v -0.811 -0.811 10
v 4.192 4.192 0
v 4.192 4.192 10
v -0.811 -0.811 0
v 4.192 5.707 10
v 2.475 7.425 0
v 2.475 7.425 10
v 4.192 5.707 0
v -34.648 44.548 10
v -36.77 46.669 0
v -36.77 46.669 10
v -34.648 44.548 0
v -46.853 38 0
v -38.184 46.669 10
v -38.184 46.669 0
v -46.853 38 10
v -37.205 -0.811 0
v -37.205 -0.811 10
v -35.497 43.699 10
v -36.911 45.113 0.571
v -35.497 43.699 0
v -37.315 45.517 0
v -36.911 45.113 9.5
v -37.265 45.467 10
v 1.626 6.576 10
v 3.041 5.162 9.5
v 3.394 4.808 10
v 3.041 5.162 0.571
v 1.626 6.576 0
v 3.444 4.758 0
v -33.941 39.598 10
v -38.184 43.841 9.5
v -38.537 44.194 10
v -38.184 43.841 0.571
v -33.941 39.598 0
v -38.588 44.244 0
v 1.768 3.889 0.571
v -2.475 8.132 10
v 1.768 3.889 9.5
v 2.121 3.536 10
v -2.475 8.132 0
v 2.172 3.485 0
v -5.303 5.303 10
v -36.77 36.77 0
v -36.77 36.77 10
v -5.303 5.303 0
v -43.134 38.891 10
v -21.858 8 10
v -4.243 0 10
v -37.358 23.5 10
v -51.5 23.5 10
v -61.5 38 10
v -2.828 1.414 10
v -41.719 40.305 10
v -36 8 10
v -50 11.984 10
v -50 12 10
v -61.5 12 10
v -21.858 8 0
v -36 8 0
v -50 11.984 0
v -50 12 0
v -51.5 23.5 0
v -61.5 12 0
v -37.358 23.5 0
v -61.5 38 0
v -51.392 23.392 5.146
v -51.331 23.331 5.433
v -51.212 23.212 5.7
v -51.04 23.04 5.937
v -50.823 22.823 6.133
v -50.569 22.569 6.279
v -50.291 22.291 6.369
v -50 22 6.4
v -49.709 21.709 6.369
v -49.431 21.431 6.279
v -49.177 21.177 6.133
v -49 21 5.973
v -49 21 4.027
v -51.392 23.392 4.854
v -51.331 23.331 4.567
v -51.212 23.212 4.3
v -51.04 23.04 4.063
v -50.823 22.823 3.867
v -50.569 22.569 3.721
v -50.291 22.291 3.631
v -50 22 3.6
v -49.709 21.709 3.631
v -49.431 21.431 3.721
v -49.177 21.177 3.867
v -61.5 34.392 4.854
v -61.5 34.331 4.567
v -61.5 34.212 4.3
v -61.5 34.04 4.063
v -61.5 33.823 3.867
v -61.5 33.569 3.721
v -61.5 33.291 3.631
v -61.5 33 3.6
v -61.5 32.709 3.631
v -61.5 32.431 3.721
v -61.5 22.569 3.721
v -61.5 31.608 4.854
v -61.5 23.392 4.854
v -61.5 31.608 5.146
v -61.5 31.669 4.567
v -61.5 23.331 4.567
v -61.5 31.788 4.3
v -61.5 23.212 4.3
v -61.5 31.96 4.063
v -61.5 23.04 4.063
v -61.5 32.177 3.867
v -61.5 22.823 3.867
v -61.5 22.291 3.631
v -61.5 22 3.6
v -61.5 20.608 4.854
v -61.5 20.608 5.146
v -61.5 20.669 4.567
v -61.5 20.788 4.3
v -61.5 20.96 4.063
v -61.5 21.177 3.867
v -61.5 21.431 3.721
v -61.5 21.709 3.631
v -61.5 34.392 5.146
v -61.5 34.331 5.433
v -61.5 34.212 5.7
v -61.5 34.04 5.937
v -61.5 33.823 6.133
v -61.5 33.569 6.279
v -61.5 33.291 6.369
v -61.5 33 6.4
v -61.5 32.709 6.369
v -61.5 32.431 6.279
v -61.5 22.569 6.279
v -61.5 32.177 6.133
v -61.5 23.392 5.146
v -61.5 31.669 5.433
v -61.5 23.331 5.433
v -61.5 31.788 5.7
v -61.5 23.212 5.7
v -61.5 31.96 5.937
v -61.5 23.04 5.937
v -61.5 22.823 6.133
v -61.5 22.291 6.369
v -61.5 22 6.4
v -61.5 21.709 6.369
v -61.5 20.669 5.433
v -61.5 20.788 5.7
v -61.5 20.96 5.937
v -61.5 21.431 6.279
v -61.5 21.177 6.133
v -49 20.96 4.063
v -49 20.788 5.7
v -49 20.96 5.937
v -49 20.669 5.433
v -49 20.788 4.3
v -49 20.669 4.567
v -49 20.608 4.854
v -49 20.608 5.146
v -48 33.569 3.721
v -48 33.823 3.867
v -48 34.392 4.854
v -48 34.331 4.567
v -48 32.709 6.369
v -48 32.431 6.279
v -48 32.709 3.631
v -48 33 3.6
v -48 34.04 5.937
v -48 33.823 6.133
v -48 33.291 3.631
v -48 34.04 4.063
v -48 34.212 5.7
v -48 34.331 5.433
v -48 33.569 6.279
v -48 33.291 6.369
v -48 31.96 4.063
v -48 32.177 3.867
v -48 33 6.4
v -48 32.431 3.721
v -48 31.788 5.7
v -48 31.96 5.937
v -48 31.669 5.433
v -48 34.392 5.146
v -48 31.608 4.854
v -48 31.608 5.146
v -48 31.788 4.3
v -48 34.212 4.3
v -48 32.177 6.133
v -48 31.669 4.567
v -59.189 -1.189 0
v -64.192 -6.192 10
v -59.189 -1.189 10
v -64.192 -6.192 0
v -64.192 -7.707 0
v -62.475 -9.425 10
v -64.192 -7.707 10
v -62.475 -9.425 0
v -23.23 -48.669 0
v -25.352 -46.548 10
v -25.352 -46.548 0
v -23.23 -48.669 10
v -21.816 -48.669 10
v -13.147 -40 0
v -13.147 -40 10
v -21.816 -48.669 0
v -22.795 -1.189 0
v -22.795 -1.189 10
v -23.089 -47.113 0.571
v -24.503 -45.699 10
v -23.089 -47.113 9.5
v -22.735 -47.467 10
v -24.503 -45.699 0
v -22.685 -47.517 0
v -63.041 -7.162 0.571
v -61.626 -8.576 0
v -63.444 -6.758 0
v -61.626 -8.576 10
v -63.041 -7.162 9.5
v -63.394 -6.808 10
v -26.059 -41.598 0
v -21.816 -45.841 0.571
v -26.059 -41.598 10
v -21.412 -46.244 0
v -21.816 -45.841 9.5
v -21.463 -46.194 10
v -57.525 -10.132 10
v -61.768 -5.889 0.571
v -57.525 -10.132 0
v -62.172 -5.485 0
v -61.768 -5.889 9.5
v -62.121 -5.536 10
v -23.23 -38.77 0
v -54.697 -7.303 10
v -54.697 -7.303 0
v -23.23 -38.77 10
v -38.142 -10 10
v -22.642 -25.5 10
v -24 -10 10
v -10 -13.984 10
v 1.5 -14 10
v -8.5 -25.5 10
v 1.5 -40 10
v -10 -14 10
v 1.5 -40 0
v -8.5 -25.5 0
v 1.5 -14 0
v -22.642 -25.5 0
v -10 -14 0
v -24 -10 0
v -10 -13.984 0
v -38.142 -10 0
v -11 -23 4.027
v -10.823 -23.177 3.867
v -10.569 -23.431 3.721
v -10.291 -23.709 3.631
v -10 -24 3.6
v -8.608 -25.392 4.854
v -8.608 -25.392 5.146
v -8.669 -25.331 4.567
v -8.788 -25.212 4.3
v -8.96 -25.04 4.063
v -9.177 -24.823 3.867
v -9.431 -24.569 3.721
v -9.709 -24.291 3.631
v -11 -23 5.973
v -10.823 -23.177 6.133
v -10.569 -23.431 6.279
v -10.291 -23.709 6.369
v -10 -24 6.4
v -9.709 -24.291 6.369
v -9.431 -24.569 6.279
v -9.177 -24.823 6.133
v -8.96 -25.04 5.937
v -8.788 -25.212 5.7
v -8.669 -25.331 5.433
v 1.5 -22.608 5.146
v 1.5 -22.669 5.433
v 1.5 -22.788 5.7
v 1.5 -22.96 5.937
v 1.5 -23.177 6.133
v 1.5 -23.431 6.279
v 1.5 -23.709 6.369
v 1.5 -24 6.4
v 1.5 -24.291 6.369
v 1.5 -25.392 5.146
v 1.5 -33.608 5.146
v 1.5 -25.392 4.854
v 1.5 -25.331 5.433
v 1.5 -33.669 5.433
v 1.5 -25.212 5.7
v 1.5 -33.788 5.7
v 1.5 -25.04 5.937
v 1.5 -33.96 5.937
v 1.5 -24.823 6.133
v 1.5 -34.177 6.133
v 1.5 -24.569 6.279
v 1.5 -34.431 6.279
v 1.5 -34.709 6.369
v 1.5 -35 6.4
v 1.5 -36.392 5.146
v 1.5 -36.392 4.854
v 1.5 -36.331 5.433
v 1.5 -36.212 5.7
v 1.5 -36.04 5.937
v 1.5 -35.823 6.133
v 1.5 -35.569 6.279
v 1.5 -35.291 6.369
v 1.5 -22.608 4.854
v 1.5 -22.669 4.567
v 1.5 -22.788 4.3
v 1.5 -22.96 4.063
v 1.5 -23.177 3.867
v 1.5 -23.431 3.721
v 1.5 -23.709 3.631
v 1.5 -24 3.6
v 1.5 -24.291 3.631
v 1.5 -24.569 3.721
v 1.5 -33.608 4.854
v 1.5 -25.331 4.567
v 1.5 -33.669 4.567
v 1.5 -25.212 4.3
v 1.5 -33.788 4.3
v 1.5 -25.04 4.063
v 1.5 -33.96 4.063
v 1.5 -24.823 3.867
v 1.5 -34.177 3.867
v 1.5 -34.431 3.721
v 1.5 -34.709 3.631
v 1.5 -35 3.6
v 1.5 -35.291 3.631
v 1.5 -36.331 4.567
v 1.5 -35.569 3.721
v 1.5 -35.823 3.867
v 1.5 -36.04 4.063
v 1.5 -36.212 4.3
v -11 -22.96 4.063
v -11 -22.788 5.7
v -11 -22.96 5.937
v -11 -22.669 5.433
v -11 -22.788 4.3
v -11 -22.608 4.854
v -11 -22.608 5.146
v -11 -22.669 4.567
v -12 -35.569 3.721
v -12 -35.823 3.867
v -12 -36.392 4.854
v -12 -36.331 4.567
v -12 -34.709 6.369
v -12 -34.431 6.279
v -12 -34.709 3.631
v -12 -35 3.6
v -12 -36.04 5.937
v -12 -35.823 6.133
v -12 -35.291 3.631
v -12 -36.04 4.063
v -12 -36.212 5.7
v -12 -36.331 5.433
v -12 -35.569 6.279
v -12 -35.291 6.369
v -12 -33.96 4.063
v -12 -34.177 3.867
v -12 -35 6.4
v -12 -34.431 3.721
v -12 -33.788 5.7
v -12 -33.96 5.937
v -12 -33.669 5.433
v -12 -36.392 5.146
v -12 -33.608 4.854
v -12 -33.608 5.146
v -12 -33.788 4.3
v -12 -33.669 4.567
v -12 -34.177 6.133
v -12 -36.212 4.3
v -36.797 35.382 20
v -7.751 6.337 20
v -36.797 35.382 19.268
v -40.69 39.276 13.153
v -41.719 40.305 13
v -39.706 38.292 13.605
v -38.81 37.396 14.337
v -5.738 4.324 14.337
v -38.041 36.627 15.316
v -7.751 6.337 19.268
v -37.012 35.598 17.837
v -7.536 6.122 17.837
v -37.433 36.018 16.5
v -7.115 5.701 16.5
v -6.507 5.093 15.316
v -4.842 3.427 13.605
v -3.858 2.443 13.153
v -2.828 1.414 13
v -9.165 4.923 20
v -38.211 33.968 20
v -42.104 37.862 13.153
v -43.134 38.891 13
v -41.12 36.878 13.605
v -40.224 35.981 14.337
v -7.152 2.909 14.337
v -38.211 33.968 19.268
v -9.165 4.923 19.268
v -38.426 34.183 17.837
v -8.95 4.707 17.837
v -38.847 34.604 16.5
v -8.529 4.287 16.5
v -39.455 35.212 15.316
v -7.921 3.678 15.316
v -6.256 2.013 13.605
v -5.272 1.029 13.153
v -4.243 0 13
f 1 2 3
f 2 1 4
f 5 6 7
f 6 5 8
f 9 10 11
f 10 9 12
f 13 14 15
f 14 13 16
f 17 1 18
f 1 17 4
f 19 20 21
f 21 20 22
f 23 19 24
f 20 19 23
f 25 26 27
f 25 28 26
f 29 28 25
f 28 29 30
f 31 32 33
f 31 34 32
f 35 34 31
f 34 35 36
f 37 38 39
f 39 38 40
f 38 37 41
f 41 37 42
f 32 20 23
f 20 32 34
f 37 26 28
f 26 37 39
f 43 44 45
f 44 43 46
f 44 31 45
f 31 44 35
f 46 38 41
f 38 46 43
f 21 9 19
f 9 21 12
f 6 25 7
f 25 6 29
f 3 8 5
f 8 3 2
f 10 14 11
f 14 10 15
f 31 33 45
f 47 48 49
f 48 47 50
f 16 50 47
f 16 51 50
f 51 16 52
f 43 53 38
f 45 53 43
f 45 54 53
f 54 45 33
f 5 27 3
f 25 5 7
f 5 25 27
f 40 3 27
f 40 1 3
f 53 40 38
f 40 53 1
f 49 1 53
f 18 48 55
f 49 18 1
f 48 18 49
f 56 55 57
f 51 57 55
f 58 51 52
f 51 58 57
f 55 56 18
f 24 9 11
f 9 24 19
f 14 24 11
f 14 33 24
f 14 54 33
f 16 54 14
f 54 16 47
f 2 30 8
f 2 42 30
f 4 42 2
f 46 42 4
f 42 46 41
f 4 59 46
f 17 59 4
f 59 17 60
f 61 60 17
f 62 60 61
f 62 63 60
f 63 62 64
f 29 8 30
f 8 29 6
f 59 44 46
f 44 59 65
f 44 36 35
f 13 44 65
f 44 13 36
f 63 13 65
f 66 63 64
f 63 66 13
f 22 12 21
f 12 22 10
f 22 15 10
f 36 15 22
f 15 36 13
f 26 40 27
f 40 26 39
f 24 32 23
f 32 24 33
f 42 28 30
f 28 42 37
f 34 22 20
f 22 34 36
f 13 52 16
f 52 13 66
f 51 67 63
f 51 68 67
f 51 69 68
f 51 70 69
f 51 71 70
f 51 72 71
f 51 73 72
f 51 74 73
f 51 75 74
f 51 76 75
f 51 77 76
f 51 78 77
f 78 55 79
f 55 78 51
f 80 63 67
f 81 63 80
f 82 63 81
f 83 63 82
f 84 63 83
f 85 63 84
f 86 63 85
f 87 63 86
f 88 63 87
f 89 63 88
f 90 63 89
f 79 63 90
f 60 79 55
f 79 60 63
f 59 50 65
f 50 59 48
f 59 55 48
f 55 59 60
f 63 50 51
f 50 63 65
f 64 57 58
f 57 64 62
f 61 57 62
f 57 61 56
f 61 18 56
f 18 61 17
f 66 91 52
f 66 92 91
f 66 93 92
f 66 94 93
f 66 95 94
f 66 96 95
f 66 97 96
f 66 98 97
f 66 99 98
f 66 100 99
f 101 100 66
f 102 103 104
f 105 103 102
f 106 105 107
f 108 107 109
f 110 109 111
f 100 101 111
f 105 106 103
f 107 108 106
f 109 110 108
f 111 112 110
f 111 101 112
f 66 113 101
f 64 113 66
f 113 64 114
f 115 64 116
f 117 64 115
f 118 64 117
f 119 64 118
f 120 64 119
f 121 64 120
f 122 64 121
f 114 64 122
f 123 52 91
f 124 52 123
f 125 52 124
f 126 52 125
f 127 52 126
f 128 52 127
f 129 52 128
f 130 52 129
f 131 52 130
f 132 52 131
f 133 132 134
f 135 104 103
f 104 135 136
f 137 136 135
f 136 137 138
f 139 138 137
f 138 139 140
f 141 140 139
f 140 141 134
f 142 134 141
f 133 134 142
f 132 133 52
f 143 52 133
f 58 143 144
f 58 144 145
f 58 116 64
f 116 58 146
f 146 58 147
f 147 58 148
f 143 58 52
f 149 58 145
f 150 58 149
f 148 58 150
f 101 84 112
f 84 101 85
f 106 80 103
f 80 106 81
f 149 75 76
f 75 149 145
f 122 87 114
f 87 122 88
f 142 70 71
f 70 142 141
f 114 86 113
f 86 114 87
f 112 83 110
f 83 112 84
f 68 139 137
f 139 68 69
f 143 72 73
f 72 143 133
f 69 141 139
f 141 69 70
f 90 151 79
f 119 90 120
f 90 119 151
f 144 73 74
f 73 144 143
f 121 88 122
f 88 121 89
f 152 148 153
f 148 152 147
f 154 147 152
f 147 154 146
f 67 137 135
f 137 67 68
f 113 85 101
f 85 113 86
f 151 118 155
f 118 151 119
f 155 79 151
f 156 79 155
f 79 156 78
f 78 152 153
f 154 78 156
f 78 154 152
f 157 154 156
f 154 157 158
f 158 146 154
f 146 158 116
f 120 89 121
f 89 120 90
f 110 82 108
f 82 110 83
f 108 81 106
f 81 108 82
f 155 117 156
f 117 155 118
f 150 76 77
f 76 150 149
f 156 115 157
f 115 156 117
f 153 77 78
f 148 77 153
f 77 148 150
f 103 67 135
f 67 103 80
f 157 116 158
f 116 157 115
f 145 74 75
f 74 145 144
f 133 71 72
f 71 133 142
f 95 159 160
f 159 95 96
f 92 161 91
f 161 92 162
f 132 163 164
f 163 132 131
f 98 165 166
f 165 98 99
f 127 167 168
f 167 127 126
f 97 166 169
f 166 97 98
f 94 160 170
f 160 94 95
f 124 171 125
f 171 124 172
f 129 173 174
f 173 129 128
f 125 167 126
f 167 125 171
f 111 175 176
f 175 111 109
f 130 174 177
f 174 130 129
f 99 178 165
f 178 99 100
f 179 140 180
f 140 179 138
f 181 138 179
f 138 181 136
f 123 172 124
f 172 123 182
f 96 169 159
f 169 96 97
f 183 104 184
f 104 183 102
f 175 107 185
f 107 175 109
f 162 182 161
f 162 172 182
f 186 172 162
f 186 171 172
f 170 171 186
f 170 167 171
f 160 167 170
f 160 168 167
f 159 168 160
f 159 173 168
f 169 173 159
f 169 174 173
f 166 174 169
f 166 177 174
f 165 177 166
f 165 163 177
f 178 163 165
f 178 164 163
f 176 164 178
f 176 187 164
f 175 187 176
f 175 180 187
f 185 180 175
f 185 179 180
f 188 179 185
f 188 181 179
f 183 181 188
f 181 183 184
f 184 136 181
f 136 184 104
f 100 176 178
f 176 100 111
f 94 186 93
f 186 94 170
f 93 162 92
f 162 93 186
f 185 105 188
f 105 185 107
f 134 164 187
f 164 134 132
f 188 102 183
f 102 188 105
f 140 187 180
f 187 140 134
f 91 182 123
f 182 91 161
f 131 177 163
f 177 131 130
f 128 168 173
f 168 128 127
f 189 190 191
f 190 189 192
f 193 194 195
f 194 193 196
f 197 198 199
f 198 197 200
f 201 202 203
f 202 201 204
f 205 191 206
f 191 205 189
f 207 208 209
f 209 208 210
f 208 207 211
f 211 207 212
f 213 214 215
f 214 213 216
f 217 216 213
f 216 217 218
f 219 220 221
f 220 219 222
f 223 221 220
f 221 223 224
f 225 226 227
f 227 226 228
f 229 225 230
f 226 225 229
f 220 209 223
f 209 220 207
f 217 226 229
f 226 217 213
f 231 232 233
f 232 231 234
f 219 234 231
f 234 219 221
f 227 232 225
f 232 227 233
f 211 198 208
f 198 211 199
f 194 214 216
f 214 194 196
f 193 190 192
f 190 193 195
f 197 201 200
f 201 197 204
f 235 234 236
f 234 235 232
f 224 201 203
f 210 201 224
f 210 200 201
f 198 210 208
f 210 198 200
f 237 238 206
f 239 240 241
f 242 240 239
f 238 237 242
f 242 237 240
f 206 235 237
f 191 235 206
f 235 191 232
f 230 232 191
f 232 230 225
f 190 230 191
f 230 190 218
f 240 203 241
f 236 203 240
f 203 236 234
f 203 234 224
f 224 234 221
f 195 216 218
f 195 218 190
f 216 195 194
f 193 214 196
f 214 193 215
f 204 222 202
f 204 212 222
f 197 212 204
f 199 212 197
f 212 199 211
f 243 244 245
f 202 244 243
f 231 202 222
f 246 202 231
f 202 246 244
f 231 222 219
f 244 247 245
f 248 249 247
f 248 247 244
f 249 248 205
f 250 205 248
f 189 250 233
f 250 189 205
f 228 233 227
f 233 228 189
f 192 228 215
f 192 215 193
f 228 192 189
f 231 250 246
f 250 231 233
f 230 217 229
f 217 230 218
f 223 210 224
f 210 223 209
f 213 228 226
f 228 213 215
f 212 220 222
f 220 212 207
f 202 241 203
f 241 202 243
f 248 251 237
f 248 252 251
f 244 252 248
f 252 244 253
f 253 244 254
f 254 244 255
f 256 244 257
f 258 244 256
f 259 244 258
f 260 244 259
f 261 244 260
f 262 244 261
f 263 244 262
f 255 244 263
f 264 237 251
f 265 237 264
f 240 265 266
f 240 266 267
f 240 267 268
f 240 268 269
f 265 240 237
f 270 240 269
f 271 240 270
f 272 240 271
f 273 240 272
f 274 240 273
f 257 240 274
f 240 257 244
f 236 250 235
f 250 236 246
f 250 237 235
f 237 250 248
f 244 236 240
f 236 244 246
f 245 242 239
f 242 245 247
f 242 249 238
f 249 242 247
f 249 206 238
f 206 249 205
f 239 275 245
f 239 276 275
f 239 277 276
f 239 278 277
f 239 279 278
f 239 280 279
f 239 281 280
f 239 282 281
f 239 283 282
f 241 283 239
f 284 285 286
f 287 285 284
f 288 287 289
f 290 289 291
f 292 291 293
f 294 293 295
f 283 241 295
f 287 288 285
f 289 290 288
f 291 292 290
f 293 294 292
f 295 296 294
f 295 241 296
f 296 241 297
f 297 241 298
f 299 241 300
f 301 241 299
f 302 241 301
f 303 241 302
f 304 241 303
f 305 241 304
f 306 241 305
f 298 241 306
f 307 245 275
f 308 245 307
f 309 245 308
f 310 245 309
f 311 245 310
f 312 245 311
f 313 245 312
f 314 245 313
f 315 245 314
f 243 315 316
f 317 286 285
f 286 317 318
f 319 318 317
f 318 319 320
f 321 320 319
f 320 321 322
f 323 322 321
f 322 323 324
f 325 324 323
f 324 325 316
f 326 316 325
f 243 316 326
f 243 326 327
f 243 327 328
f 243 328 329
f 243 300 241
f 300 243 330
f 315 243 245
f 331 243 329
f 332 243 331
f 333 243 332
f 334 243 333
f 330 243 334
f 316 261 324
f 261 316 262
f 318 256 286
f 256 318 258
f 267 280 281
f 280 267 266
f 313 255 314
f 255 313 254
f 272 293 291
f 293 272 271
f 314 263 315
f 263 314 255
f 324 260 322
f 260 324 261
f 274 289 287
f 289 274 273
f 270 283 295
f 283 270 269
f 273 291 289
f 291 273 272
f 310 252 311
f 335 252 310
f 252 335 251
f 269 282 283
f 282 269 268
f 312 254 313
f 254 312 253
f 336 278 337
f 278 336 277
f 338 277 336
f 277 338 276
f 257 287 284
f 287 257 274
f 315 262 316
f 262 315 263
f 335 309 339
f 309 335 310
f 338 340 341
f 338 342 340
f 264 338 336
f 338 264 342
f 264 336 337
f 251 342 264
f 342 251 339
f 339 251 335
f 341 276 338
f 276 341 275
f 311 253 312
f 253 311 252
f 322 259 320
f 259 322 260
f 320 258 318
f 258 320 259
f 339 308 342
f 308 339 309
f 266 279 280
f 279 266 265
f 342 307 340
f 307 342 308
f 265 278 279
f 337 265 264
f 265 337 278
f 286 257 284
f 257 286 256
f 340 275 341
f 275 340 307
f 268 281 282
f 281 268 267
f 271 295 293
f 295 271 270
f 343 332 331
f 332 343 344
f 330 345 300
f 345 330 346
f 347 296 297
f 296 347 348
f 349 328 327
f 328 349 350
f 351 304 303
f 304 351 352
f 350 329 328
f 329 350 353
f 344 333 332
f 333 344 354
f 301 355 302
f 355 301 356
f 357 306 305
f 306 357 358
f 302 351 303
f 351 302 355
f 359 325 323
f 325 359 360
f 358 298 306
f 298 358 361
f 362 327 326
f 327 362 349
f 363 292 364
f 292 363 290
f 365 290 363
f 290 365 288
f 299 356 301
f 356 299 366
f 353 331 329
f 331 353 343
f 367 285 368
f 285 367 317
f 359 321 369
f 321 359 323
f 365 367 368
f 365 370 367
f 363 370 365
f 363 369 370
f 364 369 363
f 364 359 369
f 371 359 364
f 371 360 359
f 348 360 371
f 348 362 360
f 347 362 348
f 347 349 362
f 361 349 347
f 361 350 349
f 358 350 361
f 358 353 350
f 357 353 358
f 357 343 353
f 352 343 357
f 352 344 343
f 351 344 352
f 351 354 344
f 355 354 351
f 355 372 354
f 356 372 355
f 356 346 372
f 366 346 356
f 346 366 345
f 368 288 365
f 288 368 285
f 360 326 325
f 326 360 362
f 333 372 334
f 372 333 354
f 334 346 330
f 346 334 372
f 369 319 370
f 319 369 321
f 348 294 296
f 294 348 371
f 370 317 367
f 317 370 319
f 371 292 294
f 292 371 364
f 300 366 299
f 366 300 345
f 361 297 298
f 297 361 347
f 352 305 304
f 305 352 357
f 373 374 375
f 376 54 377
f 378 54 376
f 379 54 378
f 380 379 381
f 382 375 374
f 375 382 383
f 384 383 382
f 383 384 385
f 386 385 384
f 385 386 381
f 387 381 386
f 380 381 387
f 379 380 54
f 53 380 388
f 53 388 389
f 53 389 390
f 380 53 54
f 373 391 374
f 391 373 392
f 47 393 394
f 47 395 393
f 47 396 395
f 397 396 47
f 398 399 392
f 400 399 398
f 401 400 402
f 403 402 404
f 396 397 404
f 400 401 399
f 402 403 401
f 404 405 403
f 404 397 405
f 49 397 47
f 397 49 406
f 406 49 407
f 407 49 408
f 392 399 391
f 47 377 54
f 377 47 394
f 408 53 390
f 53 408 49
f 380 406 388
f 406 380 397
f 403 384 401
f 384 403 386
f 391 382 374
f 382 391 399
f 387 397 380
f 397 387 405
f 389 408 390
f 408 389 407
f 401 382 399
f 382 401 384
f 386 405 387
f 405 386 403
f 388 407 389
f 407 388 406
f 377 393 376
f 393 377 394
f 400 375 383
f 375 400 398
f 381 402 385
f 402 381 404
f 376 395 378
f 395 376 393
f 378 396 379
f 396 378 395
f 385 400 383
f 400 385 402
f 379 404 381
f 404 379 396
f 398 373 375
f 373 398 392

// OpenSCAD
// PRUSA iteration4
// lcd supports
// GNU GPL v3
// Josef Průša <iam@josefprusa.cz> and contributors
// http://www.reprap.org/wiki/Prusa_Mendel
// http://prusamendel.org




module body()
{

    difference()
        {
        // base block
        translate([-55,-2,0]) cube([69,81,10]);

            union ()
            {
                // outer body shape
                translate([-69.6,32,-1]) rotate([0,0,45]) cube([60,53,15]);
                translate([13.7,89.7,-1]) rotate([0,0,135]) cube([60,42,15]);
                translate([-19,-9,-1]) cube([60,9,15] );
                translate([7,-3,-1]) cube([60,68,16]);
                translate([-16,60,-1]) cube([60,50,15] );
                translate([-41, -45,-1]) rotate([0,0,45]) cube([60,80,13]);

                // pcb cout out
                translate([4,1.5,-1]) cube([1.8,56.5,17]);
                translate([0,7.5,-1]) cube([5.8,44.5,17]);
                translate([4.8,3.5,-1]) cube([5.8,52.5,17]);
                translate([8,-5,-1] ) rotate([0,0,45]) cube([5,5,17]);
                translate([8,58,-1]) rotate([0,0,45]) cube([5,5,17]);
            }

            // pcb inserts
            translate([4,3,8]) rotate([45,0,0]) cube([1.8,5,5]);
            translate([4,56.5,8]) rotate([45,0,0]) cube([1.8,5,5]);
            translate([4,3,-5]) rotate([45,0,0]) cube([1.8,5,5]);
            translate([4,56.5,-5]) rotate([45,0,0]) cube([1.8,5,5]);
        }
}



module LCD_support_r()
{
    difference()
    {

        union()
        {
            rotate([0,0,45]) body();
            // screw block
            translate([-72,22,0])  cube([30,16,10]);
        }

        // lower angled part cut
        translate([-75,-2,-1])  cube([20,14,15]);
        translate([-70,-2,-1]) cube([20,14,15]);
        translate([-50,-16.3,-1]) rotate([0,0,45]) cube([20,20,15]);

        translate([-76.5,-2,-1]) cube([15,40,15]);

        difference()
        {
            translate([-28,0,-1]) rotate([0,0,45]) cube([10,40,15]);
            translate([-38,-12,-1]) cube([20,20,15]);
            translate([-58,23.5,-1]) cube([25,25,15]);
        }

        // screw holes
        translate([-71,18+4,5]) rotate([0,90,0]) cylinder(h=22, d=2.8, $fn=30);
        translate([-70,29+4,5]) rotate([0,90,0]) cylinder(h=22, d=2.8, $fn=30);

        // nut traps
        //translate([-58,15.1+4,5-2.8]) cube([2.2,5.8,29.7]);
        //translate([-58,26.1+4,5-2.8]) cube([2.2,5.8,29.7]);

        // version
        //translate([-20,2,9.5]) rotate([0,0,0]) linear_extrude(height = 0.6)
        //{ text("R1",font = "helvetica:style=Bold", size=5, center=true); }
    }
}


module LCD_support_l()
{
    LCD_support_r();

    rotate([0,0,45]) difference()
    {
        // sd card shield
        translate([-3,3,10])  cube([2,55,10]);
        translate([-4,3,20]) rotate([0,90,0]) cylinder( h=4, r=7, $fn=30);
        translate([-4,58,20]) rotate([0,90,0]) cylinder( h=4, r=7, $fn=30);
    }
}

translate([-60,-2,0]) rotate([0,0,180]) LCD_support_r();
LCD_support_l();
